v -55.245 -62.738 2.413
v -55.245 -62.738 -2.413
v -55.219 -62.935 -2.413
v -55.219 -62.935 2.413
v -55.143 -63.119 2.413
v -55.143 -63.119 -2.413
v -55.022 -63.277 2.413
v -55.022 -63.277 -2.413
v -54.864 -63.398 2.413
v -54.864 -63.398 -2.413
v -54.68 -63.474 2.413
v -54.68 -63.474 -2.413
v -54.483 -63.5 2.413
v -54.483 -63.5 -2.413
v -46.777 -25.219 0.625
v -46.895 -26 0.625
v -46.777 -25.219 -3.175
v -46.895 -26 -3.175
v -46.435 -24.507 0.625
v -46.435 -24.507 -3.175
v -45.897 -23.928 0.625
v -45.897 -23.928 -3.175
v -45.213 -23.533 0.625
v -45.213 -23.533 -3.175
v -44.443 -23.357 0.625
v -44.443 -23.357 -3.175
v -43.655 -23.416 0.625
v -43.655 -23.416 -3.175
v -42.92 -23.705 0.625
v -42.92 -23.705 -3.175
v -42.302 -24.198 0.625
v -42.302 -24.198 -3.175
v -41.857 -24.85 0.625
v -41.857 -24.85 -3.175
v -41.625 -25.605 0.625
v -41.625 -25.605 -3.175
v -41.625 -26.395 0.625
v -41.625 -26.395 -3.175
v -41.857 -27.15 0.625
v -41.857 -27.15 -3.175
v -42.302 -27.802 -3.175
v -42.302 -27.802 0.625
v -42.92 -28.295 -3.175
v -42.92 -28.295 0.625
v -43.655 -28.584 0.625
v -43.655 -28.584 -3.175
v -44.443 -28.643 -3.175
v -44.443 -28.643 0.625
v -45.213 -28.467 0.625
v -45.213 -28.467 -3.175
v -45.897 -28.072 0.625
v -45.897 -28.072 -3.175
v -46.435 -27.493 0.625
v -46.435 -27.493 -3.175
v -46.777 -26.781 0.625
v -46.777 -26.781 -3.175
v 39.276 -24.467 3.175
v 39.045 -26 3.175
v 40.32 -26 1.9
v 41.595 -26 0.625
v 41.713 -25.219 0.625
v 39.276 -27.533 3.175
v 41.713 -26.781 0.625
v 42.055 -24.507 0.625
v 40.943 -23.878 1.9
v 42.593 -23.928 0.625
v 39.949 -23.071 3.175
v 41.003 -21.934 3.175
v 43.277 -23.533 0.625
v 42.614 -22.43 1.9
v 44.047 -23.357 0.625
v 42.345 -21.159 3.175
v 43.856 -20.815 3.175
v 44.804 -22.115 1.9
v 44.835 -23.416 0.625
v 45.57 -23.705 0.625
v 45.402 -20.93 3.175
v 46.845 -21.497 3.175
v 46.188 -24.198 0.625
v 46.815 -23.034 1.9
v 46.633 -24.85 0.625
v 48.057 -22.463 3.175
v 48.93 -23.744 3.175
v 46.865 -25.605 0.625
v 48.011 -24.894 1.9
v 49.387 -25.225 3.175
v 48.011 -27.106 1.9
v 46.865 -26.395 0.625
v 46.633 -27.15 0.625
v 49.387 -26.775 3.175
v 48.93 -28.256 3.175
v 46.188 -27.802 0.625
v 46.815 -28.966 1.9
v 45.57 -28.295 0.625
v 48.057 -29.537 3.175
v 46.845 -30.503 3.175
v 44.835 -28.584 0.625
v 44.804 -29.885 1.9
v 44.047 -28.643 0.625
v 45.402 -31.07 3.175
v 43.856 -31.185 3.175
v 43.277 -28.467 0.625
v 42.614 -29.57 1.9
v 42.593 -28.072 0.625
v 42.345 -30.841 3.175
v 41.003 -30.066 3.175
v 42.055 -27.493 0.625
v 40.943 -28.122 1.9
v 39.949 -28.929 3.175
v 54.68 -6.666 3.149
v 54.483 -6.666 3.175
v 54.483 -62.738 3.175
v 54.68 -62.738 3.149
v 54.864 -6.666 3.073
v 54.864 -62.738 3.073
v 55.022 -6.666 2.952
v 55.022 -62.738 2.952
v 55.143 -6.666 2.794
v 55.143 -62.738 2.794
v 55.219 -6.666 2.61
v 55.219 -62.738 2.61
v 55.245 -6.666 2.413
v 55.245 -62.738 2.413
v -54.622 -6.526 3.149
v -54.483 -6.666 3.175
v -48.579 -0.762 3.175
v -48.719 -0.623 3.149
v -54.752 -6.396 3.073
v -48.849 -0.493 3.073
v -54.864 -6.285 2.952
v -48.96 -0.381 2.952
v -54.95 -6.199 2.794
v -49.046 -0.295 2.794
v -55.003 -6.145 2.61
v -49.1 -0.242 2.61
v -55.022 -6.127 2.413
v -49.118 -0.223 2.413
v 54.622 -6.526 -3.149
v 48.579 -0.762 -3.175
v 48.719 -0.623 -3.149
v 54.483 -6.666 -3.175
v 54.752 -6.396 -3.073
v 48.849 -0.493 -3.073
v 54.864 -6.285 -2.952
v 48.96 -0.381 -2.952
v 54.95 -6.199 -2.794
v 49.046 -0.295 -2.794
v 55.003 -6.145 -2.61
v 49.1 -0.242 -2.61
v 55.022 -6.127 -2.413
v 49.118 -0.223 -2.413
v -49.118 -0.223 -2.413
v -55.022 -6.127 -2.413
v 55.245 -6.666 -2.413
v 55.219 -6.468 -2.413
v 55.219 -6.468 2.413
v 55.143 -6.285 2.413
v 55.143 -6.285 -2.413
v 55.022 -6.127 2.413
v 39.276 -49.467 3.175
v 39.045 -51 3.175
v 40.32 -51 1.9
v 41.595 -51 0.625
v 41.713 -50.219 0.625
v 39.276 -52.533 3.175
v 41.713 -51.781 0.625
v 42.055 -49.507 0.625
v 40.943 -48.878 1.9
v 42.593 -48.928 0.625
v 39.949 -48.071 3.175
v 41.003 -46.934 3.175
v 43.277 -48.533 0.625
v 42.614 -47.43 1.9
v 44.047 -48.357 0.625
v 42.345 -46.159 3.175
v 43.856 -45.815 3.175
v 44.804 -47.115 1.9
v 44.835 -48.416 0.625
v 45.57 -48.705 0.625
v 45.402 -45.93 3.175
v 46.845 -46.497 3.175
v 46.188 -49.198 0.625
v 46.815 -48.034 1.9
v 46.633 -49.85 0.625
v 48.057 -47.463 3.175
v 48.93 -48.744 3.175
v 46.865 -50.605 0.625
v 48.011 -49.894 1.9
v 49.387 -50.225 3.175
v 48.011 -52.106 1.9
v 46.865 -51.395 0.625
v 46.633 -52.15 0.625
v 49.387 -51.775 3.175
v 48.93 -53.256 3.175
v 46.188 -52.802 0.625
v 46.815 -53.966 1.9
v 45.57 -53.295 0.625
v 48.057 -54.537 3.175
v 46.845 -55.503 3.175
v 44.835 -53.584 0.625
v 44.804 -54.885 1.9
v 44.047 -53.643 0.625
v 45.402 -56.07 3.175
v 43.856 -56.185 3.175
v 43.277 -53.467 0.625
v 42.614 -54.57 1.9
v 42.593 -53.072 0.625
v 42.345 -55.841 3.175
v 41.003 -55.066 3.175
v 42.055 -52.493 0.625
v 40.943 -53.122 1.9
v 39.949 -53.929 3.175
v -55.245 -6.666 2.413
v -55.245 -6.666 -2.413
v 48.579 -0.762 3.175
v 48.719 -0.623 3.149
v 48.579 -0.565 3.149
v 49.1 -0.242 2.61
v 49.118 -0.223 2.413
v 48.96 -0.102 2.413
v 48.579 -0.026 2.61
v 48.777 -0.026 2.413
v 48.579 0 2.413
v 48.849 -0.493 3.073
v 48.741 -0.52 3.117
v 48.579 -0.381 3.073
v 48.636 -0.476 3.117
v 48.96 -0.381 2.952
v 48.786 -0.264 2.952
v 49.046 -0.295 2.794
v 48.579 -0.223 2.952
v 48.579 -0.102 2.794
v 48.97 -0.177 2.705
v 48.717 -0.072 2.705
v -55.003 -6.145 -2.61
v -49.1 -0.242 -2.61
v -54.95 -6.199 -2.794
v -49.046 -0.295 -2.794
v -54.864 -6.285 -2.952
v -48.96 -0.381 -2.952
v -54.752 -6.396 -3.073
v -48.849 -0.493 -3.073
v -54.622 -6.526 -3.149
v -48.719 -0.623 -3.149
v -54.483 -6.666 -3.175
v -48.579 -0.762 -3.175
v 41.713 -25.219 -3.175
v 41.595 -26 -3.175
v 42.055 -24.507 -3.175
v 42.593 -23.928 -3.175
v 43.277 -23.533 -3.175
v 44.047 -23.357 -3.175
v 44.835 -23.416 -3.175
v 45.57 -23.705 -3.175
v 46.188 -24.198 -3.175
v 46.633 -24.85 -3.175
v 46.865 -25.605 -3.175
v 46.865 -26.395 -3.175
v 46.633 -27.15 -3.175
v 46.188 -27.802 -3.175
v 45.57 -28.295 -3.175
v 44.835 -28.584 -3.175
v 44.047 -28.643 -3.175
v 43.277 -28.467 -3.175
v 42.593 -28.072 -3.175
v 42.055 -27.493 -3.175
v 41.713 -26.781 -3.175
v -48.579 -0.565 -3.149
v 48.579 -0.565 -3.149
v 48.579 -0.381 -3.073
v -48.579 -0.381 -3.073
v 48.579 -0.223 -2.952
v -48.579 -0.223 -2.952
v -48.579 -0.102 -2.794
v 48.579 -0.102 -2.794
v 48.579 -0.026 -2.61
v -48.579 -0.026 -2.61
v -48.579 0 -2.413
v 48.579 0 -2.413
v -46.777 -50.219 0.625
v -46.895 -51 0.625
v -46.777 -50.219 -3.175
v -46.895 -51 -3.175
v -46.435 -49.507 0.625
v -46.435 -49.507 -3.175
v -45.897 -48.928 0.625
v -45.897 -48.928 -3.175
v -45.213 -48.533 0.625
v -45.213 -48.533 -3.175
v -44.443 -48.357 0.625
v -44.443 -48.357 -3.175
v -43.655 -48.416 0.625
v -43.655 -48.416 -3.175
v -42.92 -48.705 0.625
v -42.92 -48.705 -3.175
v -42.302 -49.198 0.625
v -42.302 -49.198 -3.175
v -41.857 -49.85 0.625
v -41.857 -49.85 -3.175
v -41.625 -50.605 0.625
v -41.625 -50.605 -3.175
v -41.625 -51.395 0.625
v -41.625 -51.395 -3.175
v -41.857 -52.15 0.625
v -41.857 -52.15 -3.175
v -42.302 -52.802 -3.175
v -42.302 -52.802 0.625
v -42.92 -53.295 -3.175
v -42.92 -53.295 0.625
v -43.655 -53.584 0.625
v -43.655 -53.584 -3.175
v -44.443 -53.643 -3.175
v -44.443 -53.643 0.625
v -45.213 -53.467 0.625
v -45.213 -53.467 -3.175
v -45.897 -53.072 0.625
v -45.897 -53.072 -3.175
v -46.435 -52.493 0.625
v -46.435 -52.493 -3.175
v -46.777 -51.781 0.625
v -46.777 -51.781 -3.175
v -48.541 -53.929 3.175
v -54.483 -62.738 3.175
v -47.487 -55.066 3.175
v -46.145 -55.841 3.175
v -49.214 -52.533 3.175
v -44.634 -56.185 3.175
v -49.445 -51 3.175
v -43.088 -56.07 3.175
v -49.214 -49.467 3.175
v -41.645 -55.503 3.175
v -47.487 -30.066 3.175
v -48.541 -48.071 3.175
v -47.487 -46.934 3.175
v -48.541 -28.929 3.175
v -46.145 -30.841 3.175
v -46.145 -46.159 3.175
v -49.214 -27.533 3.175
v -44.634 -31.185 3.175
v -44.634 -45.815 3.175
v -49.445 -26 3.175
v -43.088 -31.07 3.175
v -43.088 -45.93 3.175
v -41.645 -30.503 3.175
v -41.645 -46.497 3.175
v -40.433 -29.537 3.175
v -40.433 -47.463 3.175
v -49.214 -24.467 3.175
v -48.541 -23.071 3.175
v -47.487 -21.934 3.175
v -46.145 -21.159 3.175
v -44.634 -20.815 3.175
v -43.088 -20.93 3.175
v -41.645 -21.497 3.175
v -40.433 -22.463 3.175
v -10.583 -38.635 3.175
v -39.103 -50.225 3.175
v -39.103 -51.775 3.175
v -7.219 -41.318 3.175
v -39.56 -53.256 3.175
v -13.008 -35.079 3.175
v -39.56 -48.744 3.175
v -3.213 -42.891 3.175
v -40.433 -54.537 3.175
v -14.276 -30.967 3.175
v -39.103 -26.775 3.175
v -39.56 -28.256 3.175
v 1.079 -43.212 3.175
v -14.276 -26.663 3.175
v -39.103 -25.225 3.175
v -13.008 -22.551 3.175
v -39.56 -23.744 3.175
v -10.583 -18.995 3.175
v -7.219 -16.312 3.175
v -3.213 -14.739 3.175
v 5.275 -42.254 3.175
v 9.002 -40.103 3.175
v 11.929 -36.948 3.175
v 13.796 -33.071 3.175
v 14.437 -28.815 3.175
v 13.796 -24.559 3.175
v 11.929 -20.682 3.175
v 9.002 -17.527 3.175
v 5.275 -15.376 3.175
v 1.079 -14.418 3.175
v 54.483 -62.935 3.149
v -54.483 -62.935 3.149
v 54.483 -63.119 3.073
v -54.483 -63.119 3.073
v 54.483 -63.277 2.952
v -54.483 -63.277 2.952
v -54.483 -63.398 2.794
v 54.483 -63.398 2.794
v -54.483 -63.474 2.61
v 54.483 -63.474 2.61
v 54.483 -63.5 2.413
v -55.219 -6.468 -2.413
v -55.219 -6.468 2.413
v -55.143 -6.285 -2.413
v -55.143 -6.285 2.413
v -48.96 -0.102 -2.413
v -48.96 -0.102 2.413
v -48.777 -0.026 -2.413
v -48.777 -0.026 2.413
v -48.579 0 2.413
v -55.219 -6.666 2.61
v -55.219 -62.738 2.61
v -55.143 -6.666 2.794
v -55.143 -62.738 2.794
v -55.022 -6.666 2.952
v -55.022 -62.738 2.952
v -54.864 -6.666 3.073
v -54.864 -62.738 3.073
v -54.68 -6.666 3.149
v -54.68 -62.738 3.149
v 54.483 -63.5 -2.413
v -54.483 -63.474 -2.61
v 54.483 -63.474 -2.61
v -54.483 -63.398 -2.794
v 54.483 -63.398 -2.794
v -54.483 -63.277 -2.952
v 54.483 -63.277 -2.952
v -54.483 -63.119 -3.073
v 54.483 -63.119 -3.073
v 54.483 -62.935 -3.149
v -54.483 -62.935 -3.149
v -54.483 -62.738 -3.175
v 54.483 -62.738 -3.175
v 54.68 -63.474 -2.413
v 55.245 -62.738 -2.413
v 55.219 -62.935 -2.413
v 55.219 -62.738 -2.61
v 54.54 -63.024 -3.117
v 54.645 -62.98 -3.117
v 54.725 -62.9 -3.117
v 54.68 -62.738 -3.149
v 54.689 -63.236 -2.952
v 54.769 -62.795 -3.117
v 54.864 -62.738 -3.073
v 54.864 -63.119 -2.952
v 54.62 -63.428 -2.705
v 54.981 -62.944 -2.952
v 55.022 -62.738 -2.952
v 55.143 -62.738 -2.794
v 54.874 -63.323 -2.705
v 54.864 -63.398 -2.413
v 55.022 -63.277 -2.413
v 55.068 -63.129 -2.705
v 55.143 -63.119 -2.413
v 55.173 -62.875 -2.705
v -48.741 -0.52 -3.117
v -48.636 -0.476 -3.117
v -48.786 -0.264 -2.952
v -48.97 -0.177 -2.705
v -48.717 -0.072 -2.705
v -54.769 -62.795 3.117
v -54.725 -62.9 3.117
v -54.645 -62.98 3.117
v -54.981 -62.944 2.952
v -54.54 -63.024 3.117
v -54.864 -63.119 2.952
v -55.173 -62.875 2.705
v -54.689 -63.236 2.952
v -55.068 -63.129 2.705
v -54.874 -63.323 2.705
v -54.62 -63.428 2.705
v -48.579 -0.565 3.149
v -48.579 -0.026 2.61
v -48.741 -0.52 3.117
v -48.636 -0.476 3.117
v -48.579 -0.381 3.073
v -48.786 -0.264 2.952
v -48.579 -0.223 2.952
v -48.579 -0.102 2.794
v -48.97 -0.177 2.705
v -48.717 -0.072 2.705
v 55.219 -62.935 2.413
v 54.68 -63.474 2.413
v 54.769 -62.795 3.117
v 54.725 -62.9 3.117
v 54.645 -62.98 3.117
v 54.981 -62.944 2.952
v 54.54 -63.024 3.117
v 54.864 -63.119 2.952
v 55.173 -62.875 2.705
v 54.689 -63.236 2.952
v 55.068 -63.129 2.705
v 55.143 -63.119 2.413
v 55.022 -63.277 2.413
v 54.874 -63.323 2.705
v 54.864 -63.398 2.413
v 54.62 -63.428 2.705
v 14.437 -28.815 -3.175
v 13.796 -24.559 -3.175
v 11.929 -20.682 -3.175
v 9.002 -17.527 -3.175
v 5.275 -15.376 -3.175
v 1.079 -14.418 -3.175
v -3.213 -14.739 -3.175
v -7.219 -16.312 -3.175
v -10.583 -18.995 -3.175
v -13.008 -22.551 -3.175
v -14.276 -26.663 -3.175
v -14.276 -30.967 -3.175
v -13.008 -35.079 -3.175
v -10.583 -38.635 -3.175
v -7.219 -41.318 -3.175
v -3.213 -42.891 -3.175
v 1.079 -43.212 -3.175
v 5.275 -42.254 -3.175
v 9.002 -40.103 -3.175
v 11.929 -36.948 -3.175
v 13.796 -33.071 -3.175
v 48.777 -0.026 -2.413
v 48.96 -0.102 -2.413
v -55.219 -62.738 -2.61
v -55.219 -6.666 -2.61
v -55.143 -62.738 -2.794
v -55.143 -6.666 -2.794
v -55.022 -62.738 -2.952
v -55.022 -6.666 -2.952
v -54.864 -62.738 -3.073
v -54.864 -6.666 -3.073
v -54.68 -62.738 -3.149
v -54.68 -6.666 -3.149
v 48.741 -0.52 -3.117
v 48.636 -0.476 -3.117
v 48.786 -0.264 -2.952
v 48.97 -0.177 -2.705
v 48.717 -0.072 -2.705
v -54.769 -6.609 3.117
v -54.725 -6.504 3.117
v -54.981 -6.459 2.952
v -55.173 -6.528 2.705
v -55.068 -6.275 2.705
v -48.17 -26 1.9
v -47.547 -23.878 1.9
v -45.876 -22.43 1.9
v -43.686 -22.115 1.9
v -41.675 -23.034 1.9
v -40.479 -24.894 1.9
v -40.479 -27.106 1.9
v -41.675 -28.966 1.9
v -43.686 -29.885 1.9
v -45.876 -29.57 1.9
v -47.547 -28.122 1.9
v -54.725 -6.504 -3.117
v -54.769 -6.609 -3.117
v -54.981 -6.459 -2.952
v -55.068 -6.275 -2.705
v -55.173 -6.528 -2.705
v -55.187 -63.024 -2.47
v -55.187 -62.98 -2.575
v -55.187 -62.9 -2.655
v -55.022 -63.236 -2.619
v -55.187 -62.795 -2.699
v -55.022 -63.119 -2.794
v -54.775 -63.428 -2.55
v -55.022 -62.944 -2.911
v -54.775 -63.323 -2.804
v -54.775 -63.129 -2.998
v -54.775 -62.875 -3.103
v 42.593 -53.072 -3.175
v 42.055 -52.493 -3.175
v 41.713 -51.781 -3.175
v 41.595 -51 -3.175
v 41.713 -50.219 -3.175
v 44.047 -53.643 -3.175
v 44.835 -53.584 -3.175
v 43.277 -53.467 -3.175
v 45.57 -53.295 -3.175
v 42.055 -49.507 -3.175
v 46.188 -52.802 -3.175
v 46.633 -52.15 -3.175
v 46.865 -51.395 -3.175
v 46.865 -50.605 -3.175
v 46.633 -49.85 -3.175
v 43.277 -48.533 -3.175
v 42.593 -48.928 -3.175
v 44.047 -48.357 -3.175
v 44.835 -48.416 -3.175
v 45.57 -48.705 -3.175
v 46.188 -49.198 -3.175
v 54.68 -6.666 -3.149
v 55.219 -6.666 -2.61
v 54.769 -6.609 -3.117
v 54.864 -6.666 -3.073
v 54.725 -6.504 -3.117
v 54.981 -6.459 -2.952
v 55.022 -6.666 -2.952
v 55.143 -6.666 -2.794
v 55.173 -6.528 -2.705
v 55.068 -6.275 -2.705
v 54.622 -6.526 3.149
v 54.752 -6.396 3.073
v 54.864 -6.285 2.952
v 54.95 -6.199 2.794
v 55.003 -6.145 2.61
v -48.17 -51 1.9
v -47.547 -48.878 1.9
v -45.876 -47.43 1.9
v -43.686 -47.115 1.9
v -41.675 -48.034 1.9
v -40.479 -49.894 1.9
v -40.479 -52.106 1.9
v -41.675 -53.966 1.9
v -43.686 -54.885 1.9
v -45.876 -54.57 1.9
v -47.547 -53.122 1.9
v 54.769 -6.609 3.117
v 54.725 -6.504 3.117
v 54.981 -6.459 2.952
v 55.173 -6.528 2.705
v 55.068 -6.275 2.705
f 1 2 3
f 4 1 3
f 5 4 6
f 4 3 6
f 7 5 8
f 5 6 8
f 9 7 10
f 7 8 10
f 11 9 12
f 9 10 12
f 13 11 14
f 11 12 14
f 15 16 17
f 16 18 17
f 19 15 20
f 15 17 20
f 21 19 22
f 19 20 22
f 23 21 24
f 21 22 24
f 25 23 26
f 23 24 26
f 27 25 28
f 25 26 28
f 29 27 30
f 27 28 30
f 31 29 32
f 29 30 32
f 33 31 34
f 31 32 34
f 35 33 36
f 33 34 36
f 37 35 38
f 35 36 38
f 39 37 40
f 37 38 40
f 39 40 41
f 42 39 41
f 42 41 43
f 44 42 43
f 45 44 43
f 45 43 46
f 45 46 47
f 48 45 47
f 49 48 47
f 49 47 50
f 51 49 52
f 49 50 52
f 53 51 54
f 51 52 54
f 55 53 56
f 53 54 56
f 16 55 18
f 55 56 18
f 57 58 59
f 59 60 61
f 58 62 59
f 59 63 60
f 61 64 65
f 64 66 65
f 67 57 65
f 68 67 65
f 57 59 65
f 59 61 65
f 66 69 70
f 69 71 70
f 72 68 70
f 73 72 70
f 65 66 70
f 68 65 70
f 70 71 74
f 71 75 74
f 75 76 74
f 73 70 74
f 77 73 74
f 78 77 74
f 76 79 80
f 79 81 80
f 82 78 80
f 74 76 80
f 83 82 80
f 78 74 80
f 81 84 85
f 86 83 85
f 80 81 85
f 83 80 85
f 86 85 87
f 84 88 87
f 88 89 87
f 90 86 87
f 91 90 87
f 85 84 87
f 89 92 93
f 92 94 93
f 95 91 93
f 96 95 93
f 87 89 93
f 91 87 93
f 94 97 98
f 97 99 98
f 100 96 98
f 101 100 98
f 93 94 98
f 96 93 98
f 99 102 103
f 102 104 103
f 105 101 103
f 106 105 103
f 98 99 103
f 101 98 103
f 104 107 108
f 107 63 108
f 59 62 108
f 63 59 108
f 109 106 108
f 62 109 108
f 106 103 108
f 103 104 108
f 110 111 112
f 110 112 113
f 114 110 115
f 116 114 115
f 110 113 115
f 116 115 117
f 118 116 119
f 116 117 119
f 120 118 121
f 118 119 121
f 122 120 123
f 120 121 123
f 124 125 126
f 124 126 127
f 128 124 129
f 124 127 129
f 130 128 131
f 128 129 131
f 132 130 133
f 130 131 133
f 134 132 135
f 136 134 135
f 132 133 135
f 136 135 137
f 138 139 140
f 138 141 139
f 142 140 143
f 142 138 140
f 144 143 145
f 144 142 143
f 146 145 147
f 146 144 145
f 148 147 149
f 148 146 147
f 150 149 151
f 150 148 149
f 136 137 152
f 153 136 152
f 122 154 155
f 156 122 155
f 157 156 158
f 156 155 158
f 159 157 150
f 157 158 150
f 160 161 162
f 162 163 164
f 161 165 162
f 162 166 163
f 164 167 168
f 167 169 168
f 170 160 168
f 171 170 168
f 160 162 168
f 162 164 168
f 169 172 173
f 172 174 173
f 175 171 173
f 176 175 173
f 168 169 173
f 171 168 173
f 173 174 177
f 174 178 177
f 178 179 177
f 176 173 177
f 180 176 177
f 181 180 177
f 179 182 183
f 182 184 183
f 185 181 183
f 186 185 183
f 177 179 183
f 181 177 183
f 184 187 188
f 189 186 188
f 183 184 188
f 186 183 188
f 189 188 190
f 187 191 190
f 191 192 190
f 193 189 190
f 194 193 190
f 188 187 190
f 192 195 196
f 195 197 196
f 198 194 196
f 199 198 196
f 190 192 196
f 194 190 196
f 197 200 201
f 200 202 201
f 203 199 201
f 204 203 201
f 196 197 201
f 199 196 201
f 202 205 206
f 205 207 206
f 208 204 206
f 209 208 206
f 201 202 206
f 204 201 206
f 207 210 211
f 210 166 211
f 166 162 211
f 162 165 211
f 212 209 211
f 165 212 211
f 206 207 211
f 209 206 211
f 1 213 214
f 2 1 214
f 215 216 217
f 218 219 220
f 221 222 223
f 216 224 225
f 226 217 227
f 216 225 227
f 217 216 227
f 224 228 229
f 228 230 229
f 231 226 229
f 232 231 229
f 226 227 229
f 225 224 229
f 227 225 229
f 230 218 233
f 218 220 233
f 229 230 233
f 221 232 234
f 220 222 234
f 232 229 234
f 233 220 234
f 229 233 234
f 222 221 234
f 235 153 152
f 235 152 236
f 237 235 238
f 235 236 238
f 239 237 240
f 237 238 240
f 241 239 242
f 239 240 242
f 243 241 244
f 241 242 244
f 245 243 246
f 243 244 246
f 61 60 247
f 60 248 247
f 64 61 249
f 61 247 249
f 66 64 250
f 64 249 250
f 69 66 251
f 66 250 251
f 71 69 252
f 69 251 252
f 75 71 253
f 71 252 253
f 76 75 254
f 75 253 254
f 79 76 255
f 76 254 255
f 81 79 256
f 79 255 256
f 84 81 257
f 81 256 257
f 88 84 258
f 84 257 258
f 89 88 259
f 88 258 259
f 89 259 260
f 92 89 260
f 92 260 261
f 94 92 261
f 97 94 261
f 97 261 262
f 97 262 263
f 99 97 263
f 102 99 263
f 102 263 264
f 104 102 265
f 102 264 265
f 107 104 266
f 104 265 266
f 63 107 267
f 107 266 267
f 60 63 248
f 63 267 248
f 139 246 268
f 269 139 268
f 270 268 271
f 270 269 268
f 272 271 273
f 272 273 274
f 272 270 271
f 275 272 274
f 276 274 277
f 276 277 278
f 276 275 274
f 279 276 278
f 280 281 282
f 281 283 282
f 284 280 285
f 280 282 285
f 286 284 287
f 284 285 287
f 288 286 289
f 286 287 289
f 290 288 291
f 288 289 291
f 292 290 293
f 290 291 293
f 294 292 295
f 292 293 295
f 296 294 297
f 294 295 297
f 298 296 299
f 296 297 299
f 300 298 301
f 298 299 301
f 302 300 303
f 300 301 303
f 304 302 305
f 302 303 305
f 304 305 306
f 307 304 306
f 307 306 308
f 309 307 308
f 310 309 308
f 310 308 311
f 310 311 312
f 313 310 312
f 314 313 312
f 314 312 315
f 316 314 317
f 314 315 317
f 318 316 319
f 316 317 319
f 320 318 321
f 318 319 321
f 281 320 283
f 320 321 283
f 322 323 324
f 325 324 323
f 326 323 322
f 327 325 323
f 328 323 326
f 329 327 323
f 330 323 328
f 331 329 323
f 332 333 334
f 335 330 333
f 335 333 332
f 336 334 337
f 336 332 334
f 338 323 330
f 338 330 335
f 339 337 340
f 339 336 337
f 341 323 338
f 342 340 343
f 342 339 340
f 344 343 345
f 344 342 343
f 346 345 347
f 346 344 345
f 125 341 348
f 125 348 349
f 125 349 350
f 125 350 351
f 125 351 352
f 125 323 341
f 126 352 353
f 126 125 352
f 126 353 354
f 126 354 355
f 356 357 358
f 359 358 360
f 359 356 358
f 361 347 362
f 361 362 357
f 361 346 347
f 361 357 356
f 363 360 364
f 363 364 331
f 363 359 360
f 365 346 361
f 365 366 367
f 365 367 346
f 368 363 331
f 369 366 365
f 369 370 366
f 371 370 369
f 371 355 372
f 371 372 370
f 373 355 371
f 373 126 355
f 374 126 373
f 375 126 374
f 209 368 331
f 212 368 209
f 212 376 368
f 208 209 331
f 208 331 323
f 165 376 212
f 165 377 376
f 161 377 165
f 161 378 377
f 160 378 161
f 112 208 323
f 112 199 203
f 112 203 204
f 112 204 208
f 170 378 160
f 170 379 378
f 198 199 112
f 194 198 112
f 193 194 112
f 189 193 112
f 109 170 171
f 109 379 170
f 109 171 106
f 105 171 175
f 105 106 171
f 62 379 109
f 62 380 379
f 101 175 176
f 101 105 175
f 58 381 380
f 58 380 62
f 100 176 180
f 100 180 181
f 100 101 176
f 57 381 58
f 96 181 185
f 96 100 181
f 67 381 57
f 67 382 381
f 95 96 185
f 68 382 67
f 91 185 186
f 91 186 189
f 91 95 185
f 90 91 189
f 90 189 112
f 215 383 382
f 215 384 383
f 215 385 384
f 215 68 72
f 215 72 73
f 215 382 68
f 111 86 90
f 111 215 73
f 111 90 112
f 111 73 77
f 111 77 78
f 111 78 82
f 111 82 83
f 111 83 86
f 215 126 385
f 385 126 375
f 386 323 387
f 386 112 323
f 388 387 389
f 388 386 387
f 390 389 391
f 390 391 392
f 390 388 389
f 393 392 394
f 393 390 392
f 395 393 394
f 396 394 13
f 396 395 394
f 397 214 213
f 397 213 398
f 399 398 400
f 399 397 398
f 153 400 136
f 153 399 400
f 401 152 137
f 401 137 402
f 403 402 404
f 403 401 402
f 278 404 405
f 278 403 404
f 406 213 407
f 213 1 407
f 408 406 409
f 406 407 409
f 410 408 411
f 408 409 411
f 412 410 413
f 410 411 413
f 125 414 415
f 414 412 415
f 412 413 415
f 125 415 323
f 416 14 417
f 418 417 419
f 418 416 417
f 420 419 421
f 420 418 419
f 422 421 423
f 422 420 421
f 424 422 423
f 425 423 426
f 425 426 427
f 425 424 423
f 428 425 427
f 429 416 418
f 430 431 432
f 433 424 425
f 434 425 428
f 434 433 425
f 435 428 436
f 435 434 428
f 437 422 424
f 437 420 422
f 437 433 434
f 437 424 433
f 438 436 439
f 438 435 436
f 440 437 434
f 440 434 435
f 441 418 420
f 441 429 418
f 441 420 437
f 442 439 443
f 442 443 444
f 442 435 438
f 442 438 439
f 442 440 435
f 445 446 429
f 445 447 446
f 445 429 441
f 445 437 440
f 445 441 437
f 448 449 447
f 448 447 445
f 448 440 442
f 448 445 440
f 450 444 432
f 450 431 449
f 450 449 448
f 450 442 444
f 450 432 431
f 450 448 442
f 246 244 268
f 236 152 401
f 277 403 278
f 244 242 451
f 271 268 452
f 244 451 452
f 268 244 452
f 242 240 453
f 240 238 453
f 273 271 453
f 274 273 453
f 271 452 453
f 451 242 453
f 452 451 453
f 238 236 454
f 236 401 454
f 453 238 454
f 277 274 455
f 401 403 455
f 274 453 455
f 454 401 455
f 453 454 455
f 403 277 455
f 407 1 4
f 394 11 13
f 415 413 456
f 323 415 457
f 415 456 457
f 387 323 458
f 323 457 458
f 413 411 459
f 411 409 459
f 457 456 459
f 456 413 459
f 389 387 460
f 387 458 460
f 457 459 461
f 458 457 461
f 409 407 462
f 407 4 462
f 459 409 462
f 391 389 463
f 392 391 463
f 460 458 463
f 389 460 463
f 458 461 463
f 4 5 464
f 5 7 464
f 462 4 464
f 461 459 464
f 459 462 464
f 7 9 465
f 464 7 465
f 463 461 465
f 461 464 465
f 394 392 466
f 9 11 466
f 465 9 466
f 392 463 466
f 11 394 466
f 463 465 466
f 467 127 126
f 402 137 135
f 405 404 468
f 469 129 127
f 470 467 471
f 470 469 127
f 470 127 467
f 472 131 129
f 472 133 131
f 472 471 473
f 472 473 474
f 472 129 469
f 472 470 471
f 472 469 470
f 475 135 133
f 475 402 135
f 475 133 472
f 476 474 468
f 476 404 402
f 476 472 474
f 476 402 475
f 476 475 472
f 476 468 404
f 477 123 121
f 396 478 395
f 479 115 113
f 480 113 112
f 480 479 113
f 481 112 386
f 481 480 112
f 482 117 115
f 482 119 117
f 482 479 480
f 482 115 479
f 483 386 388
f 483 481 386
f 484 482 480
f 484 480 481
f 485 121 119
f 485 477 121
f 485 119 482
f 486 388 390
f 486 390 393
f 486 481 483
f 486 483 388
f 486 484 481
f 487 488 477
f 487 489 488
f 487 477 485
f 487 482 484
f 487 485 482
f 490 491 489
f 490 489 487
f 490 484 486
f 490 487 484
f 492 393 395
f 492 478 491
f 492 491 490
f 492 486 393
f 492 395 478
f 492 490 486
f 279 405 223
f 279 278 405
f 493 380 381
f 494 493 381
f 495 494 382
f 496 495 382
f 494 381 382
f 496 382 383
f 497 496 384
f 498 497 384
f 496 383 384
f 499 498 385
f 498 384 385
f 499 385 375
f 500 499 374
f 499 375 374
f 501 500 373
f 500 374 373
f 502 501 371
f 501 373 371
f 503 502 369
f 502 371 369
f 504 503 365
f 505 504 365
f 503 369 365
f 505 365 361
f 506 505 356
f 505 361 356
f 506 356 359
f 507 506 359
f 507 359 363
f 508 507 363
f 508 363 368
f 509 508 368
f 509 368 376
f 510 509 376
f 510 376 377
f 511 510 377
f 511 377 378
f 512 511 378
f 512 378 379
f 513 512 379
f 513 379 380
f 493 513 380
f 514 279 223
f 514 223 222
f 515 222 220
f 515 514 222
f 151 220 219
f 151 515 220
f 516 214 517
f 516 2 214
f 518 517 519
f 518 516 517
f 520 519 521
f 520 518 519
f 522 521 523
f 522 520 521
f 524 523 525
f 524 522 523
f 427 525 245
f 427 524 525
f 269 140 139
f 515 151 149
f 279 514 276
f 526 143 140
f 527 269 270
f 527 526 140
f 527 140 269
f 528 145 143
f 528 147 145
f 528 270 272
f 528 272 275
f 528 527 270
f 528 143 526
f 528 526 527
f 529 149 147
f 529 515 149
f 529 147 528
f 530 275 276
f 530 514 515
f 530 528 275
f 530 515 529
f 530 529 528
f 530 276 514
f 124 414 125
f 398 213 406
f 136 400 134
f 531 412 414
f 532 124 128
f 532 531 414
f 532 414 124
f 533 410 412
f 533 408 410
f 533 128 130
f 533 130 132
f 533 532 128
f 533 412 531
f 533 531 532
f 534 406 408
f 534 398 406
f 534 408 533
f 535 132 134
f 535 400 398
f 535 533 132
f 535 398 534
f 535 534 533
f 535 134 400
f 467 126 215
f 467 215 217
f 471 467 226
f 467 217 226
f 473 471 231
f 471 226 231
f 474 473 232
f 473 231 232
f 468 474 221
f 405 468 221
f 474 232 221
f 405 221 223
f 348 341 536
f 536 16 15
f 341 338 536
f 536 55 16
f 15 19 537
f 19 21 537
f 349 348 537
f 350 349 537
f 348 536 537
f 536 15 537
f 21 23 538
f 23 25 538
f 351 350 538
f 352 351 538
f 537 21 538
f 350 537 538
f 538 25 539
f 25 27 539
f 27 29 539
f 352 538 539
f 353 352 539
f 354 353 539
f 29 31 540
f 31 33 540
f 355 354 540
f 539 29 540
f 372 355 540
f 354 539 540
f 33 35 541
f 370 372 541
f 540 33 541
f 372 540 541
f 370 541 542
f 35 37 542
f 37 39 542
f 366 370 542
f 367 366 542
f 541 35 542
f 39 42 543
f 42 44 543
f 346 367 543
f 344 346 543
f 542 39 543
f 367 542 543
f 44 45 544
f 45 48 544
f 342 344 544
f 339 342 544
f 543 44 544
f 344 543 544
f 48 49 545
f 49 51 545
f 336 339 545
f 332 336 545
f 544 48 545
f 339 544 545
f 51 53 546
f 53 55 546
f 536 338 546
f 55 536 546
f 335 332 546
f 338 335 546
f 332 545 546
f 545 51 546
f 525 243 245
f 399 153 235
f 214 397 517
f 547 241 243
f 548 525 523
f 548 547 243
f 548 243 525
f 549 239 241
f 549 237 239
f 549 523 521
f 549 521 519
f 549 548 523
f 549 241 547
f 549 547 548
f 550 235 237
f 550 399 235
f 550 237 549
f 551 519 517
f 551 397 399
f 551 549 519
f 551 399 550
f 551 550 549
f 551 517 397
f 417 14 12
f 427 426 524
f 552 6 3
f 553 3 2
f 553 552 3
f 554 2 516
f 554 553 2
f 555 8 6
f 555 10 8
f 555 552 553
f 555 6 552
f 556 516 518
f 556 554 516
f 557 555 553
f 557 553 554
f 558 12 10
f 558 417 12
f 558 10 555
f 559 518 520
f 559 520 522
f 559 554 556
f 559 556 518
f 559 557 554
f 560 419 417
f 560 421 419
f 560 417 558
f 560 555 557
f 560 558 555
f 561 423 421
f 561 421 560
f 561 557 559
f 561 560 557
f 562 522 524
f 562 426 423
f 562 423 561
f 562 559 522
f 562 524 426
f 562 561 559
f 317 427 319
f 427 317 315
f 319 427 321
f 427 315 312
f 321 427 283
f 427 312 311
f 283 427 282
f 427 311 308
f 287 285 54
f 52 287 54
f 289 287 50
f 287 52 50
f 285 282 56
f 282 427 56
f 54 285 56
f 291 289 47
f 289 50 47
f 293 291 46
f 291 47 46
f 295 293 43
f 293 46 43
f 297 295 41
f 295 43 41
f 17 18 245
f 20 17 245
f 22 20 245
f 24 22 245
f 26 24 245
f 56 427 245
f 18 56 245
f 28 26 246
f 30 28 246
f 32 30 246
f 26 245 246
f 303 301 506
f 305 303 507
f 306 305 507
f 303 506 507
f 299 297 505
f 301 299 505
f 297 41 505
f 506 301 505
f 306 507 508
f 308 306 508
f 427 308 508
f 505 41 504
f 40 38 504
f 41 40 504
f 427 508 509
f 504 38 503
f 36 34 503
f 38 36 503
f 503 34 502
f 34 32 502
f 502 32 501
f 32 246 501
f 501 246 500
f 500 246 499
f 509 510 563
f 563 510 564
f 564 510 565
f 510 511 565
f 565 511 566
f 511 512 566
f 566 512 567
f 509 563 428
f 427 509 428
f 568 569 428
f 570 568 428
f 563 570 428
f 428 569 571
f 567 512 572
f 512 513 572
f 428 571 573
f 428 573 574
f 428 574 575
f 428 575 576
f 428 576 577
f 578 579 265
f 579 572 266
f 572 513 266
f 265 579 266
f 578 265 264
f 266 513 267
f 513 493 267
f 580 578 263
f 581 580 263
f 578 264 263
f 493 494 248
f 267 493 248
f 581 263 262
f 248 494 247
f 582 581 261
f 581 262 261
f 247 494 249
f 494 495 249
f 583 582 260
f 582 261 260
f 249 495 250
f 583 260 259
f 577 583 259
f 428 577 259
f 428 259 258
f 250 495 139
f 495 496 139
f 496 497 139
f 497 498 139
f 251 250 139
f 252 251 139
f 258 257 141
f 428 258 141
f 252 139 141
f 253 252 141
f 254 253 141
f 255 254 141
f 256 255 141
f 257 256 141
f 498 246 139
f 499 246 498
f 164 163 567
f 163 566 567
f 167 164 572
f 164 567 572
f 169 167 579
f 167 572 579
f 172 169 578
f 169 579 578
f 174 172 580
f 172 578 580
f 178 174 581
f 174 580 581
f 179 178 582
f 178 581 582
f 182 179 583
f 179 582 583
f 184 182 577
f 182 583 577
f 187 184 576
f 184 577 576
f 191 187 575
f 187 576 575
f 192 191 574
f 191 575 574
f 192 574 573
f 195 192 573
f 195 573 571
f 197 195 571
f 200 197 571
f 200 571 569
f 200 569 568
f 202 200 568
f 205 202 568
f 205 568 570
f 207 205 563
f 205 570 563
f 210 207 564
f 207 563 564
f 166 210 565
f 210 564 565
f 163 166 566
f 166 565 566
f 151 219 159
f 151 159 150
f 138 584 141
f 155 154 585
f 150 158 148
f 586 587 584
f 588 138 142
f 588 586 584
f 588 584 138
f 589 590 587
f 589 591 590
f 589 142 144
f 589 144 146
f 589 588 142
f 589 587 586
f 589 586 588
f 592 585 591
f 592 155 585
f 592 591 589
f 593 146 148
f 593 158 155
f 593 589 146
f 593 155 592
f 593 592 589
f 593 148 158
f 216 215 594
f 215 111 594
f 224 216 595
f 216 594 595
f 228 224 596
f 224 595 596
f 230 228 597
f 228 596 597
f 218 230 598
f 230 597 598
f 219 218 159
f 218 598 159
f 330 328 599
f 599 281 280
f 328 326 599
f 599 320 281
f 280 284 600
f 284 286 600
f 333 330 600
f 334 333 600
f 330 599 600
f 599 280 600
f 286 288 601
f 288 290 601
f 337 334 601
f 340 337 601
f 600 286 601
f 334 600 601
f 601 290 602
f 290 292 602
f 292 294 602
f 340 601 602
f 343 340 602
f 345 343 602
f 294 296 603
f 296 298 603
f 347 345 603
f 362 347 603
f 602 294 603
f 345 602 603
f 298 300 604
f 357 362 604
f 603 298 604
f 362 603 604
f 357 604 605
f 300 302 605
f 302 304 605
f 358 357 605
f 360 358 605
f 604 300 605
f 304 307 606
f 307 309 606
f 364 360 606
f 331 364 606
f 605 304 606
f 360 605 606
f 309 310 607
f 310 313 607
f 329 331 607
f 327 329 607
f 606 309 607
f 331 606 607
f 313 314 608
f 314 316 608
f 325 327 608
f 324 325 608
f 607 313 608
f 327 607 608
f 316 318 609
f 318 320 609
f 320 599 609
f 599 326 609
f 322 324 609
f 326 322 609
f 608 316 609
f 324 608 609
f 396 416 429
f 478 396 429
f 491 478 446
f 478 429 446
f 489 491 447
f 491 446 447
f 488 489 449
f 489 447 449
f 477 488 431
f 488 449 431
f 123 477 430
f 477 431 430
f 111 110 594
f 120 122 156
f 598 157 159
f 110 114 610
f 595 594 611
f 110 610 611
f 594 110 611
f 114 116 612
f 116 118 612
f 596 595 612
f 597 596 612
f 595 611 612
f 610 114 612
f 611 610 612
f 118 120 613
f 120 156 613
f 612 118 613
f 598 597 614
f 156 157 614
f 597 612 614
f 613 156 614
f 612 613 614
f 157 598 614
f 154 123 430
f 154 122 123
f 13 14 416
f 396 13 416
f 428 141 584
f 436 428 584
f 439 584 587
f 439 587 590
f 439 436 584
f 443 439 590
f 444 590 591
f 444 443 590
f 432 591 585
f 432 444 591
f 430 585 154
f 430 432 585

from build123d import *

# Parameters (mm, degrees)
SKETCH2_W                                       = 110.49
SKETCH2_H                                       = 6.35
BOSS_EXTRUDE1_DEPTH                             = 63.5
SKETCH3_R                                       = 14.43749998
CUT_EXTRUDE1_DEPTH                              = 85.407242136
CHAMFER1_SIZE                                   = 6.35
FILLET2_R                                       = 0.762
CSK_FOR_M5_FLAT_HEAD_MACHINE_SCREW1_D           = 5.3
CSK_FOR_M5_FLAT_HEAD_MACHINE_SCREW1_CSINK_D     = 10.4
CSK_FOR_M5_FLAT_HEAD_MACHINE_SCREW1_CSINK_ANGLE = 90


with BuildPart() as part:
    # Sketch2 → Boss-Extrude1 (new body)
    with BuildSketch(Plane(origin=(0, 0, 0), x_dir=(1, 0, 0), z_dir=(0, 1, 0))):
        Rectangle(SKETCH2_W, SKETCH2_H)
    extrude(amount=-BOSS_EXTRUDE1_DEPTH)

    # Sketch3 → Cut-Extrude1 (cut, through all)
    with BuildSketch(Plane.XY.offset(3.175)):
        with Locations((0, -28.8150046)):
            Circle(SKETCH3_R)
    extrude(amount=-CUT_EXTRUDE1_DEPTH, mode=Mode.SUBTRACT)

    # Chamfer1
    chamfer1_edges = [part.edges().sort_by_distance(p)[0] for p in [
        (55.245, 0, 0),
        (-55.245, 0, 0),
    ]]
    chamfer(chamfer1_edges, length=CHAMFER1_SIZE)

    # Fillet2
    fillet2_edges = [part.edges().sort_by_distance(p)[0] for p in [
        (55.245, -63.5, 0),
        (0, -63.5, -3.175),
        (0, 0, 3.175),
        (0, 0, -3.175),
        (48.895, 0, 0),
        (-48.895, 0, 0),
        (52.07, -3.175, 3.175),
        (-52.07, -3.175, 3.175),
        (-55.245, -6.35, 0),
        (52.07, -3.175, -3.175),
        (-52.07, -3.175, -3.175),
        (55.245, -6.35, 0),
        (-55.245, -63.5, 0),
        (-55.245, -34.925, -3.175),
        (55.245, -34.925, -3.175),
        (55.245, -34.925, 3.175),
        (-55.245, -34.925, 3.175),
        (0, -63.5, 3.175),
    ]]
    fillet(fillet2_edges, radius=FILLET2_R)

    # CSK for M5 Flat Head Machine Screw1 (through all)
    with Locations(Plane.XY.offset(3.175)):
        with Locations((-44.245, -26), (-44.245, -51), (44.245, -51), (44.245, -26)):
            CounterSinkHole(CSK_FOR_M5_FLAT_HEAD_MACHINE_SCREW1_D / 2, CSK_FOR_M5_FLAT_HEAD_MACHINE_SCREW1_CSINK_D / 2, counter_sink_angle=CSK_FOR_M5_FLAT_HEAD_MACHINE_SCREW1_CSINK_ANGLE)


solid = part.part
